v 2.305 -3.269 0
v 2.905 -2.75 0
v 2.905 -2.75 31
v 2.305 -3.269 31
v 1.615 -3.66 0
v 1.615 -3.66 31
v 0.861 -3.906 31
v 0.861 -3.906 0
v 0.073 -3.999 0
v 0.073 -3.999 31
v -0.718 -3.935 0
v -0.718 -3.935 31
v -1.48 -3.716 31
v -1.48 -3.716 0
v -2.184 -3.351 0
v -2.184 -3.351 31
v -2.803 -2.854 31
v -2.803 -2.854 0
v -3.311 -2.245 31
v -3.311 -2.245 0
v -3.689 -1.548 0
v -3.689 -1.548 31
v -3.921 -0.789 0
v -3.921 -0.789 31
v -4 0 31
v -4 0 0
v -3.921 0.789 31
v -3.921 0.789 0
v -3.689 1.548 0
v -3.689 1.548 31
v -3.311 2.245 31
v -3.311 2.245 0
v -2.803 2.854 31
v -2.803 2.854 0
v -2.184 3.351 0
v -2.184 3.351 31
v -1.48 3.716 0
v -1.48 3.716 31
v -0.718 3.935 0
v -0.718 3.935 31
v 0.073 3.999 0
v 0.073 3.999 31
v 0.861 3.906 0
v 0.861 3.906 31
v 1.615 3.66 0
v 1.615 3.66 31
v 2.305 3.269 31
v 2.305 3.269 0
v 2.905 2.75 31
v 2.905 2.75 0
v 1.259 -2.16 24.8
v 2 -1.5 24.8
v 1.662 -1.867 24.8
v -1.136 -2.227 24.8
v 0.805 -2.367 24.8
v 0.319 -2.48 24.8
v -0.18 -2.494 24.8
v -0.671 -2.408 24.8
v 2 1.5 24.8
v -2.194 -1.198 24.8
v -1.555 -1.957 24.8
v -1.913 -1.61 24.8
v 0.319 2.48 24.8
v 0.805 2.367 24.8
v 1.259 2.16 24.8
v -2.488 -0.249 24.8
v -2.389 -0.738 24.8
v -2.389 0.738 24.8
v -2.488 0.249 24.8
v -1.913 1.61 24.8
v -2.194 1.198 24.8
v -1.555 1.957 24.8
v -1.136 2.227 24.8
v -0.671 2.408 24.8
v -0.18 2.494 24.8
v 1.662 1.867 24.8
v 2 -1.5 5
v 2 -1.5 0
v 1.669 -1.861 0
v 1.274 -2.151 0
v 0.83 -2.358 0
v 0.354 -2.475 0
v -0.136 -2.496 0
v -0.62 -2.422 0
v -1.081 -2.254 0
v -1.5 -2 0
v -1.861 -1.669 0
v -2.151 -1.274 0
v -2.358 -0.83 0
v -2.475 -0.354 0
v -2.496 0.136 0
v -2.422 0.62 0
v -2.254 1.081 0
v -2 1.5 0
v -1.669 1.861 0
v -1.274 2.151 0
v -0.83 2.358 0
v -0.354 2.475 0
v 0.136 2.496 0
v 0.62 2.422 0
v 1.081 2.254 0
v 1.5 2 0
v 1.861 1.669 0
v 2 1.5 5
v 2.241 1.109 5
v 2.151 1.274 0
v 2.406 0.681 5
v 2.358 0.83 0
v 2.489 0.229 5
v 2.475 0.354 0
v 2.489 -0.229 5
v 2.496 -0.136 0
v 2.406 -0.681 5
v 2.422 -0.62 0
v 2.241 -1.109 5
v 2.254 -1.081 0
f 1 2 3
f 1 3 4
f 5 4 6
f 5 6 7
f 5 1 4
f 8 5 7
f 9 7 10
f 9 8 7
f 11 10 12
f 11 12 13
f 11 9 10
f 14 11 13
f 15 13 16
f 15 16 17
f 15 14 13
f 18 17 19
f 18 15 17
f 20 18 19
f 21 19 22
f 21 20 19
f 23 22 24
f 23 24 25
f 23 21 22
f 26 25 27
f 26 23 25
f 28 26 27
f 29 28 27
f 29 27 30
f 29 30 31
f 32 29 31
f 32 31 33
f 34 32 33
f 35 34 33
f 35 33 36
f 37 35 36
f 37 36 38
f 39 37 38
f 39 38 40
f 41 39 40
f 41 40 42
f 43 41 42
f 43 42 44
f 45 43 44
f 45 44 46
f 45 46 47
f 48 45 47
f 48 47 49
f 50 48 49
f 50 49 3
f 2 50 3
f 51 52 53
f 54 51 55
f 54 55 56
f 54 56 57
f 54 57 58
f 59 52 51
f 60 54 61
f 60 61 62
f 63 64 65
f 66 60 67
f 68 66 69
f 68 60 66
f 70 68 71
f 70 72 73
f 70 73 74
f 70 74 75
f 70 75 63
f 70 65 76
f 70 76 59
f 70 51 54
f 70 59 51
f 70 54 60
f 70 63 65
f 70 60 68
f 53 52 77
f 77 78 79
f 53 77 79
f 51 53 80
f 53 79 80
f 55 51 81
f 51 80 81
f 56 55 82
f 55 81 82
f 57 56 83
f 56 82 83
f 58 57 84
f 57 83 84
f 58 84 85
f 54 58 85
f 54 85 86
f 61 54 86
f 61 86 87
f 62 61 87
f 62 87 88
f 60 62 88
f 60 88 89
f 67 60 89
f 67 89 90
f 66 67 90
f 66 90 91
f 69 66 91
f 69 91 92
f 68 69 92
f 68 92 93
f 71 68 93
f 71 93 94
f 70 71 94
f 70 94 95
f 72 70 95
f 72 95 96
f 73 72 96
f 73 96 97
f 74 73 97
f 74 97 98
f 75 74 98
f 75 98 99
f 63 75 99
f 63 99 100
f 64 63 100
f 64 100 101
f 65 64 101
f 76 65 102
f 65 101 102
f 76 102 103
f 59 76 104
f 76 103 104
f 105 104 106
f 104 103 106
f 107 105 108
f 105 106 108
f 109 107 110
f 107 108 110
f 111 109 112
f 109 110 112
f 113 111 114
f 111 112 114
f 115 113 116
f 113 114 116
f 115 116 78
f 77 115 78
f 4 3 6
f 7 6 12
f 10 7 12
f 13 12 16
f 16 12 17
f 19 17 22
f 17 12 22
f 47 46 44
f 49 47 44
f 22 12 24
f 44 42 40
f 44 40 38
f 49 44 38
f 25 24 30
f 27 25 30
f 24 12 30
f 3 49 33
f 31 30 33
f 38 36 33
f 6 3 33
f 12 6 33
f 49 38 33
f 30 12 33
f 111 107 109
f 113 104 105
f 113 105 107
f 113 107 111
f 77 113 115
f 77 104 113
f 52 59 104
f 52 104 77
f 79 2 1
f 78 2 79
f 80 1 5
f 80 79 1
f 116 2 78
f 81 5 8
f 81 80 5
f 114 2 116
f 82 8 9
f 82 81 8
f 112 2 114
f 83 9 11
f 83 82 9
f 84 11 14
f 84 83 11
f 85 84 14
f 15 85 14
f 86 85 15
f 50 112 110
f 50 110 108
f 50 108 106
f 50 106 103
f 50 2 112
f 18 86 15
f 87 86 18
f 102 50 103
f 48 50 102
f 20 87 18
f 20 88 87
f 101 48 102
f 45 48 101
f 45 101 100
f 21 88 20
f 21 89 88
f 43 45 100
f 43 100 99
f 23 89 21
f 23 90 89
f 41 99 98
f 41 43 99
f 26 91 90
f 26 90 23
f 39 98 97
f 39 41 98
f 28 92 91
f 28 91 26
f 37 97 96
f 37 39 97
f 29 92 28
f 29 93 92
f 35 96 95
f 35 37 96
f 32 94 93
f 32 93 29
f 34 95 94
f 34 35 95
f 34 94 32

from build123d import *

# Parameters (mm, degrees)
SALIENTE_EXTRUIR1_DEPTH = 31
SALIENTE_EXTRUIR2_START = -6.2
SALIENTE_EXTRUIR2_DEPTH = 6.2
CROQUIS5_R              = 2.5
CORTAR_EXTRUIR1_DEPTH   = 5


with BuildPart() as part:
    # Croquis1 → Saliente-Extruir1 (new body)
    with BuildSketch(Plane.XY):
        with BuildLine():
            Line((2.90473751, 2.75), (2.90473751, -2.75))
            ThreePointArc((2.90473751, -2.75), (-4, 0), (2.90473751, 2.75))
        make_face()
        with BuildLine():
            Line((2, 1.5), (2, -1.5))
            ThreePointArc((2, -1.5), (-2.5, 0), (2, 1.5))
        make_face(mode=Mode.SUBTRACT)
    extrude(amount=SALIENTE_EXTRUIR1_DEPTH)

    # Croquis2 → Saliente-Extruir2 (add)
    with BuildSketch(Plane.XY.offset(31).offset(SALIENTE_EXTRUIR2_START)):
        with BuildLine():
            Line((2.90473751, 2.75), (2.90473751, -2.75))
            ThreePointArc((2.90473751, -2.75), (-4, 0), (2.90473751, 2.75))
        make_face()
    extrude(amount=SALIENTE_EXTRUIR2_DEPTH)

    # Croquis5 → Cortar-Extruir1 (cut)
    with BuildSketch(Plane(origin=(0, 0, 0), x_dir=(-1, 0, 0), z_dir=(0, 0, -1))):
        with Locations(Location((0, 0, 0), (0, 0, 216.869897646))):
            Circle(CROQUIS5_R)
    extrude(amount=-CORTAR_EXTRUIR1_DEPTH, mode=Mode.SUBTRACT)


solid = part.part
